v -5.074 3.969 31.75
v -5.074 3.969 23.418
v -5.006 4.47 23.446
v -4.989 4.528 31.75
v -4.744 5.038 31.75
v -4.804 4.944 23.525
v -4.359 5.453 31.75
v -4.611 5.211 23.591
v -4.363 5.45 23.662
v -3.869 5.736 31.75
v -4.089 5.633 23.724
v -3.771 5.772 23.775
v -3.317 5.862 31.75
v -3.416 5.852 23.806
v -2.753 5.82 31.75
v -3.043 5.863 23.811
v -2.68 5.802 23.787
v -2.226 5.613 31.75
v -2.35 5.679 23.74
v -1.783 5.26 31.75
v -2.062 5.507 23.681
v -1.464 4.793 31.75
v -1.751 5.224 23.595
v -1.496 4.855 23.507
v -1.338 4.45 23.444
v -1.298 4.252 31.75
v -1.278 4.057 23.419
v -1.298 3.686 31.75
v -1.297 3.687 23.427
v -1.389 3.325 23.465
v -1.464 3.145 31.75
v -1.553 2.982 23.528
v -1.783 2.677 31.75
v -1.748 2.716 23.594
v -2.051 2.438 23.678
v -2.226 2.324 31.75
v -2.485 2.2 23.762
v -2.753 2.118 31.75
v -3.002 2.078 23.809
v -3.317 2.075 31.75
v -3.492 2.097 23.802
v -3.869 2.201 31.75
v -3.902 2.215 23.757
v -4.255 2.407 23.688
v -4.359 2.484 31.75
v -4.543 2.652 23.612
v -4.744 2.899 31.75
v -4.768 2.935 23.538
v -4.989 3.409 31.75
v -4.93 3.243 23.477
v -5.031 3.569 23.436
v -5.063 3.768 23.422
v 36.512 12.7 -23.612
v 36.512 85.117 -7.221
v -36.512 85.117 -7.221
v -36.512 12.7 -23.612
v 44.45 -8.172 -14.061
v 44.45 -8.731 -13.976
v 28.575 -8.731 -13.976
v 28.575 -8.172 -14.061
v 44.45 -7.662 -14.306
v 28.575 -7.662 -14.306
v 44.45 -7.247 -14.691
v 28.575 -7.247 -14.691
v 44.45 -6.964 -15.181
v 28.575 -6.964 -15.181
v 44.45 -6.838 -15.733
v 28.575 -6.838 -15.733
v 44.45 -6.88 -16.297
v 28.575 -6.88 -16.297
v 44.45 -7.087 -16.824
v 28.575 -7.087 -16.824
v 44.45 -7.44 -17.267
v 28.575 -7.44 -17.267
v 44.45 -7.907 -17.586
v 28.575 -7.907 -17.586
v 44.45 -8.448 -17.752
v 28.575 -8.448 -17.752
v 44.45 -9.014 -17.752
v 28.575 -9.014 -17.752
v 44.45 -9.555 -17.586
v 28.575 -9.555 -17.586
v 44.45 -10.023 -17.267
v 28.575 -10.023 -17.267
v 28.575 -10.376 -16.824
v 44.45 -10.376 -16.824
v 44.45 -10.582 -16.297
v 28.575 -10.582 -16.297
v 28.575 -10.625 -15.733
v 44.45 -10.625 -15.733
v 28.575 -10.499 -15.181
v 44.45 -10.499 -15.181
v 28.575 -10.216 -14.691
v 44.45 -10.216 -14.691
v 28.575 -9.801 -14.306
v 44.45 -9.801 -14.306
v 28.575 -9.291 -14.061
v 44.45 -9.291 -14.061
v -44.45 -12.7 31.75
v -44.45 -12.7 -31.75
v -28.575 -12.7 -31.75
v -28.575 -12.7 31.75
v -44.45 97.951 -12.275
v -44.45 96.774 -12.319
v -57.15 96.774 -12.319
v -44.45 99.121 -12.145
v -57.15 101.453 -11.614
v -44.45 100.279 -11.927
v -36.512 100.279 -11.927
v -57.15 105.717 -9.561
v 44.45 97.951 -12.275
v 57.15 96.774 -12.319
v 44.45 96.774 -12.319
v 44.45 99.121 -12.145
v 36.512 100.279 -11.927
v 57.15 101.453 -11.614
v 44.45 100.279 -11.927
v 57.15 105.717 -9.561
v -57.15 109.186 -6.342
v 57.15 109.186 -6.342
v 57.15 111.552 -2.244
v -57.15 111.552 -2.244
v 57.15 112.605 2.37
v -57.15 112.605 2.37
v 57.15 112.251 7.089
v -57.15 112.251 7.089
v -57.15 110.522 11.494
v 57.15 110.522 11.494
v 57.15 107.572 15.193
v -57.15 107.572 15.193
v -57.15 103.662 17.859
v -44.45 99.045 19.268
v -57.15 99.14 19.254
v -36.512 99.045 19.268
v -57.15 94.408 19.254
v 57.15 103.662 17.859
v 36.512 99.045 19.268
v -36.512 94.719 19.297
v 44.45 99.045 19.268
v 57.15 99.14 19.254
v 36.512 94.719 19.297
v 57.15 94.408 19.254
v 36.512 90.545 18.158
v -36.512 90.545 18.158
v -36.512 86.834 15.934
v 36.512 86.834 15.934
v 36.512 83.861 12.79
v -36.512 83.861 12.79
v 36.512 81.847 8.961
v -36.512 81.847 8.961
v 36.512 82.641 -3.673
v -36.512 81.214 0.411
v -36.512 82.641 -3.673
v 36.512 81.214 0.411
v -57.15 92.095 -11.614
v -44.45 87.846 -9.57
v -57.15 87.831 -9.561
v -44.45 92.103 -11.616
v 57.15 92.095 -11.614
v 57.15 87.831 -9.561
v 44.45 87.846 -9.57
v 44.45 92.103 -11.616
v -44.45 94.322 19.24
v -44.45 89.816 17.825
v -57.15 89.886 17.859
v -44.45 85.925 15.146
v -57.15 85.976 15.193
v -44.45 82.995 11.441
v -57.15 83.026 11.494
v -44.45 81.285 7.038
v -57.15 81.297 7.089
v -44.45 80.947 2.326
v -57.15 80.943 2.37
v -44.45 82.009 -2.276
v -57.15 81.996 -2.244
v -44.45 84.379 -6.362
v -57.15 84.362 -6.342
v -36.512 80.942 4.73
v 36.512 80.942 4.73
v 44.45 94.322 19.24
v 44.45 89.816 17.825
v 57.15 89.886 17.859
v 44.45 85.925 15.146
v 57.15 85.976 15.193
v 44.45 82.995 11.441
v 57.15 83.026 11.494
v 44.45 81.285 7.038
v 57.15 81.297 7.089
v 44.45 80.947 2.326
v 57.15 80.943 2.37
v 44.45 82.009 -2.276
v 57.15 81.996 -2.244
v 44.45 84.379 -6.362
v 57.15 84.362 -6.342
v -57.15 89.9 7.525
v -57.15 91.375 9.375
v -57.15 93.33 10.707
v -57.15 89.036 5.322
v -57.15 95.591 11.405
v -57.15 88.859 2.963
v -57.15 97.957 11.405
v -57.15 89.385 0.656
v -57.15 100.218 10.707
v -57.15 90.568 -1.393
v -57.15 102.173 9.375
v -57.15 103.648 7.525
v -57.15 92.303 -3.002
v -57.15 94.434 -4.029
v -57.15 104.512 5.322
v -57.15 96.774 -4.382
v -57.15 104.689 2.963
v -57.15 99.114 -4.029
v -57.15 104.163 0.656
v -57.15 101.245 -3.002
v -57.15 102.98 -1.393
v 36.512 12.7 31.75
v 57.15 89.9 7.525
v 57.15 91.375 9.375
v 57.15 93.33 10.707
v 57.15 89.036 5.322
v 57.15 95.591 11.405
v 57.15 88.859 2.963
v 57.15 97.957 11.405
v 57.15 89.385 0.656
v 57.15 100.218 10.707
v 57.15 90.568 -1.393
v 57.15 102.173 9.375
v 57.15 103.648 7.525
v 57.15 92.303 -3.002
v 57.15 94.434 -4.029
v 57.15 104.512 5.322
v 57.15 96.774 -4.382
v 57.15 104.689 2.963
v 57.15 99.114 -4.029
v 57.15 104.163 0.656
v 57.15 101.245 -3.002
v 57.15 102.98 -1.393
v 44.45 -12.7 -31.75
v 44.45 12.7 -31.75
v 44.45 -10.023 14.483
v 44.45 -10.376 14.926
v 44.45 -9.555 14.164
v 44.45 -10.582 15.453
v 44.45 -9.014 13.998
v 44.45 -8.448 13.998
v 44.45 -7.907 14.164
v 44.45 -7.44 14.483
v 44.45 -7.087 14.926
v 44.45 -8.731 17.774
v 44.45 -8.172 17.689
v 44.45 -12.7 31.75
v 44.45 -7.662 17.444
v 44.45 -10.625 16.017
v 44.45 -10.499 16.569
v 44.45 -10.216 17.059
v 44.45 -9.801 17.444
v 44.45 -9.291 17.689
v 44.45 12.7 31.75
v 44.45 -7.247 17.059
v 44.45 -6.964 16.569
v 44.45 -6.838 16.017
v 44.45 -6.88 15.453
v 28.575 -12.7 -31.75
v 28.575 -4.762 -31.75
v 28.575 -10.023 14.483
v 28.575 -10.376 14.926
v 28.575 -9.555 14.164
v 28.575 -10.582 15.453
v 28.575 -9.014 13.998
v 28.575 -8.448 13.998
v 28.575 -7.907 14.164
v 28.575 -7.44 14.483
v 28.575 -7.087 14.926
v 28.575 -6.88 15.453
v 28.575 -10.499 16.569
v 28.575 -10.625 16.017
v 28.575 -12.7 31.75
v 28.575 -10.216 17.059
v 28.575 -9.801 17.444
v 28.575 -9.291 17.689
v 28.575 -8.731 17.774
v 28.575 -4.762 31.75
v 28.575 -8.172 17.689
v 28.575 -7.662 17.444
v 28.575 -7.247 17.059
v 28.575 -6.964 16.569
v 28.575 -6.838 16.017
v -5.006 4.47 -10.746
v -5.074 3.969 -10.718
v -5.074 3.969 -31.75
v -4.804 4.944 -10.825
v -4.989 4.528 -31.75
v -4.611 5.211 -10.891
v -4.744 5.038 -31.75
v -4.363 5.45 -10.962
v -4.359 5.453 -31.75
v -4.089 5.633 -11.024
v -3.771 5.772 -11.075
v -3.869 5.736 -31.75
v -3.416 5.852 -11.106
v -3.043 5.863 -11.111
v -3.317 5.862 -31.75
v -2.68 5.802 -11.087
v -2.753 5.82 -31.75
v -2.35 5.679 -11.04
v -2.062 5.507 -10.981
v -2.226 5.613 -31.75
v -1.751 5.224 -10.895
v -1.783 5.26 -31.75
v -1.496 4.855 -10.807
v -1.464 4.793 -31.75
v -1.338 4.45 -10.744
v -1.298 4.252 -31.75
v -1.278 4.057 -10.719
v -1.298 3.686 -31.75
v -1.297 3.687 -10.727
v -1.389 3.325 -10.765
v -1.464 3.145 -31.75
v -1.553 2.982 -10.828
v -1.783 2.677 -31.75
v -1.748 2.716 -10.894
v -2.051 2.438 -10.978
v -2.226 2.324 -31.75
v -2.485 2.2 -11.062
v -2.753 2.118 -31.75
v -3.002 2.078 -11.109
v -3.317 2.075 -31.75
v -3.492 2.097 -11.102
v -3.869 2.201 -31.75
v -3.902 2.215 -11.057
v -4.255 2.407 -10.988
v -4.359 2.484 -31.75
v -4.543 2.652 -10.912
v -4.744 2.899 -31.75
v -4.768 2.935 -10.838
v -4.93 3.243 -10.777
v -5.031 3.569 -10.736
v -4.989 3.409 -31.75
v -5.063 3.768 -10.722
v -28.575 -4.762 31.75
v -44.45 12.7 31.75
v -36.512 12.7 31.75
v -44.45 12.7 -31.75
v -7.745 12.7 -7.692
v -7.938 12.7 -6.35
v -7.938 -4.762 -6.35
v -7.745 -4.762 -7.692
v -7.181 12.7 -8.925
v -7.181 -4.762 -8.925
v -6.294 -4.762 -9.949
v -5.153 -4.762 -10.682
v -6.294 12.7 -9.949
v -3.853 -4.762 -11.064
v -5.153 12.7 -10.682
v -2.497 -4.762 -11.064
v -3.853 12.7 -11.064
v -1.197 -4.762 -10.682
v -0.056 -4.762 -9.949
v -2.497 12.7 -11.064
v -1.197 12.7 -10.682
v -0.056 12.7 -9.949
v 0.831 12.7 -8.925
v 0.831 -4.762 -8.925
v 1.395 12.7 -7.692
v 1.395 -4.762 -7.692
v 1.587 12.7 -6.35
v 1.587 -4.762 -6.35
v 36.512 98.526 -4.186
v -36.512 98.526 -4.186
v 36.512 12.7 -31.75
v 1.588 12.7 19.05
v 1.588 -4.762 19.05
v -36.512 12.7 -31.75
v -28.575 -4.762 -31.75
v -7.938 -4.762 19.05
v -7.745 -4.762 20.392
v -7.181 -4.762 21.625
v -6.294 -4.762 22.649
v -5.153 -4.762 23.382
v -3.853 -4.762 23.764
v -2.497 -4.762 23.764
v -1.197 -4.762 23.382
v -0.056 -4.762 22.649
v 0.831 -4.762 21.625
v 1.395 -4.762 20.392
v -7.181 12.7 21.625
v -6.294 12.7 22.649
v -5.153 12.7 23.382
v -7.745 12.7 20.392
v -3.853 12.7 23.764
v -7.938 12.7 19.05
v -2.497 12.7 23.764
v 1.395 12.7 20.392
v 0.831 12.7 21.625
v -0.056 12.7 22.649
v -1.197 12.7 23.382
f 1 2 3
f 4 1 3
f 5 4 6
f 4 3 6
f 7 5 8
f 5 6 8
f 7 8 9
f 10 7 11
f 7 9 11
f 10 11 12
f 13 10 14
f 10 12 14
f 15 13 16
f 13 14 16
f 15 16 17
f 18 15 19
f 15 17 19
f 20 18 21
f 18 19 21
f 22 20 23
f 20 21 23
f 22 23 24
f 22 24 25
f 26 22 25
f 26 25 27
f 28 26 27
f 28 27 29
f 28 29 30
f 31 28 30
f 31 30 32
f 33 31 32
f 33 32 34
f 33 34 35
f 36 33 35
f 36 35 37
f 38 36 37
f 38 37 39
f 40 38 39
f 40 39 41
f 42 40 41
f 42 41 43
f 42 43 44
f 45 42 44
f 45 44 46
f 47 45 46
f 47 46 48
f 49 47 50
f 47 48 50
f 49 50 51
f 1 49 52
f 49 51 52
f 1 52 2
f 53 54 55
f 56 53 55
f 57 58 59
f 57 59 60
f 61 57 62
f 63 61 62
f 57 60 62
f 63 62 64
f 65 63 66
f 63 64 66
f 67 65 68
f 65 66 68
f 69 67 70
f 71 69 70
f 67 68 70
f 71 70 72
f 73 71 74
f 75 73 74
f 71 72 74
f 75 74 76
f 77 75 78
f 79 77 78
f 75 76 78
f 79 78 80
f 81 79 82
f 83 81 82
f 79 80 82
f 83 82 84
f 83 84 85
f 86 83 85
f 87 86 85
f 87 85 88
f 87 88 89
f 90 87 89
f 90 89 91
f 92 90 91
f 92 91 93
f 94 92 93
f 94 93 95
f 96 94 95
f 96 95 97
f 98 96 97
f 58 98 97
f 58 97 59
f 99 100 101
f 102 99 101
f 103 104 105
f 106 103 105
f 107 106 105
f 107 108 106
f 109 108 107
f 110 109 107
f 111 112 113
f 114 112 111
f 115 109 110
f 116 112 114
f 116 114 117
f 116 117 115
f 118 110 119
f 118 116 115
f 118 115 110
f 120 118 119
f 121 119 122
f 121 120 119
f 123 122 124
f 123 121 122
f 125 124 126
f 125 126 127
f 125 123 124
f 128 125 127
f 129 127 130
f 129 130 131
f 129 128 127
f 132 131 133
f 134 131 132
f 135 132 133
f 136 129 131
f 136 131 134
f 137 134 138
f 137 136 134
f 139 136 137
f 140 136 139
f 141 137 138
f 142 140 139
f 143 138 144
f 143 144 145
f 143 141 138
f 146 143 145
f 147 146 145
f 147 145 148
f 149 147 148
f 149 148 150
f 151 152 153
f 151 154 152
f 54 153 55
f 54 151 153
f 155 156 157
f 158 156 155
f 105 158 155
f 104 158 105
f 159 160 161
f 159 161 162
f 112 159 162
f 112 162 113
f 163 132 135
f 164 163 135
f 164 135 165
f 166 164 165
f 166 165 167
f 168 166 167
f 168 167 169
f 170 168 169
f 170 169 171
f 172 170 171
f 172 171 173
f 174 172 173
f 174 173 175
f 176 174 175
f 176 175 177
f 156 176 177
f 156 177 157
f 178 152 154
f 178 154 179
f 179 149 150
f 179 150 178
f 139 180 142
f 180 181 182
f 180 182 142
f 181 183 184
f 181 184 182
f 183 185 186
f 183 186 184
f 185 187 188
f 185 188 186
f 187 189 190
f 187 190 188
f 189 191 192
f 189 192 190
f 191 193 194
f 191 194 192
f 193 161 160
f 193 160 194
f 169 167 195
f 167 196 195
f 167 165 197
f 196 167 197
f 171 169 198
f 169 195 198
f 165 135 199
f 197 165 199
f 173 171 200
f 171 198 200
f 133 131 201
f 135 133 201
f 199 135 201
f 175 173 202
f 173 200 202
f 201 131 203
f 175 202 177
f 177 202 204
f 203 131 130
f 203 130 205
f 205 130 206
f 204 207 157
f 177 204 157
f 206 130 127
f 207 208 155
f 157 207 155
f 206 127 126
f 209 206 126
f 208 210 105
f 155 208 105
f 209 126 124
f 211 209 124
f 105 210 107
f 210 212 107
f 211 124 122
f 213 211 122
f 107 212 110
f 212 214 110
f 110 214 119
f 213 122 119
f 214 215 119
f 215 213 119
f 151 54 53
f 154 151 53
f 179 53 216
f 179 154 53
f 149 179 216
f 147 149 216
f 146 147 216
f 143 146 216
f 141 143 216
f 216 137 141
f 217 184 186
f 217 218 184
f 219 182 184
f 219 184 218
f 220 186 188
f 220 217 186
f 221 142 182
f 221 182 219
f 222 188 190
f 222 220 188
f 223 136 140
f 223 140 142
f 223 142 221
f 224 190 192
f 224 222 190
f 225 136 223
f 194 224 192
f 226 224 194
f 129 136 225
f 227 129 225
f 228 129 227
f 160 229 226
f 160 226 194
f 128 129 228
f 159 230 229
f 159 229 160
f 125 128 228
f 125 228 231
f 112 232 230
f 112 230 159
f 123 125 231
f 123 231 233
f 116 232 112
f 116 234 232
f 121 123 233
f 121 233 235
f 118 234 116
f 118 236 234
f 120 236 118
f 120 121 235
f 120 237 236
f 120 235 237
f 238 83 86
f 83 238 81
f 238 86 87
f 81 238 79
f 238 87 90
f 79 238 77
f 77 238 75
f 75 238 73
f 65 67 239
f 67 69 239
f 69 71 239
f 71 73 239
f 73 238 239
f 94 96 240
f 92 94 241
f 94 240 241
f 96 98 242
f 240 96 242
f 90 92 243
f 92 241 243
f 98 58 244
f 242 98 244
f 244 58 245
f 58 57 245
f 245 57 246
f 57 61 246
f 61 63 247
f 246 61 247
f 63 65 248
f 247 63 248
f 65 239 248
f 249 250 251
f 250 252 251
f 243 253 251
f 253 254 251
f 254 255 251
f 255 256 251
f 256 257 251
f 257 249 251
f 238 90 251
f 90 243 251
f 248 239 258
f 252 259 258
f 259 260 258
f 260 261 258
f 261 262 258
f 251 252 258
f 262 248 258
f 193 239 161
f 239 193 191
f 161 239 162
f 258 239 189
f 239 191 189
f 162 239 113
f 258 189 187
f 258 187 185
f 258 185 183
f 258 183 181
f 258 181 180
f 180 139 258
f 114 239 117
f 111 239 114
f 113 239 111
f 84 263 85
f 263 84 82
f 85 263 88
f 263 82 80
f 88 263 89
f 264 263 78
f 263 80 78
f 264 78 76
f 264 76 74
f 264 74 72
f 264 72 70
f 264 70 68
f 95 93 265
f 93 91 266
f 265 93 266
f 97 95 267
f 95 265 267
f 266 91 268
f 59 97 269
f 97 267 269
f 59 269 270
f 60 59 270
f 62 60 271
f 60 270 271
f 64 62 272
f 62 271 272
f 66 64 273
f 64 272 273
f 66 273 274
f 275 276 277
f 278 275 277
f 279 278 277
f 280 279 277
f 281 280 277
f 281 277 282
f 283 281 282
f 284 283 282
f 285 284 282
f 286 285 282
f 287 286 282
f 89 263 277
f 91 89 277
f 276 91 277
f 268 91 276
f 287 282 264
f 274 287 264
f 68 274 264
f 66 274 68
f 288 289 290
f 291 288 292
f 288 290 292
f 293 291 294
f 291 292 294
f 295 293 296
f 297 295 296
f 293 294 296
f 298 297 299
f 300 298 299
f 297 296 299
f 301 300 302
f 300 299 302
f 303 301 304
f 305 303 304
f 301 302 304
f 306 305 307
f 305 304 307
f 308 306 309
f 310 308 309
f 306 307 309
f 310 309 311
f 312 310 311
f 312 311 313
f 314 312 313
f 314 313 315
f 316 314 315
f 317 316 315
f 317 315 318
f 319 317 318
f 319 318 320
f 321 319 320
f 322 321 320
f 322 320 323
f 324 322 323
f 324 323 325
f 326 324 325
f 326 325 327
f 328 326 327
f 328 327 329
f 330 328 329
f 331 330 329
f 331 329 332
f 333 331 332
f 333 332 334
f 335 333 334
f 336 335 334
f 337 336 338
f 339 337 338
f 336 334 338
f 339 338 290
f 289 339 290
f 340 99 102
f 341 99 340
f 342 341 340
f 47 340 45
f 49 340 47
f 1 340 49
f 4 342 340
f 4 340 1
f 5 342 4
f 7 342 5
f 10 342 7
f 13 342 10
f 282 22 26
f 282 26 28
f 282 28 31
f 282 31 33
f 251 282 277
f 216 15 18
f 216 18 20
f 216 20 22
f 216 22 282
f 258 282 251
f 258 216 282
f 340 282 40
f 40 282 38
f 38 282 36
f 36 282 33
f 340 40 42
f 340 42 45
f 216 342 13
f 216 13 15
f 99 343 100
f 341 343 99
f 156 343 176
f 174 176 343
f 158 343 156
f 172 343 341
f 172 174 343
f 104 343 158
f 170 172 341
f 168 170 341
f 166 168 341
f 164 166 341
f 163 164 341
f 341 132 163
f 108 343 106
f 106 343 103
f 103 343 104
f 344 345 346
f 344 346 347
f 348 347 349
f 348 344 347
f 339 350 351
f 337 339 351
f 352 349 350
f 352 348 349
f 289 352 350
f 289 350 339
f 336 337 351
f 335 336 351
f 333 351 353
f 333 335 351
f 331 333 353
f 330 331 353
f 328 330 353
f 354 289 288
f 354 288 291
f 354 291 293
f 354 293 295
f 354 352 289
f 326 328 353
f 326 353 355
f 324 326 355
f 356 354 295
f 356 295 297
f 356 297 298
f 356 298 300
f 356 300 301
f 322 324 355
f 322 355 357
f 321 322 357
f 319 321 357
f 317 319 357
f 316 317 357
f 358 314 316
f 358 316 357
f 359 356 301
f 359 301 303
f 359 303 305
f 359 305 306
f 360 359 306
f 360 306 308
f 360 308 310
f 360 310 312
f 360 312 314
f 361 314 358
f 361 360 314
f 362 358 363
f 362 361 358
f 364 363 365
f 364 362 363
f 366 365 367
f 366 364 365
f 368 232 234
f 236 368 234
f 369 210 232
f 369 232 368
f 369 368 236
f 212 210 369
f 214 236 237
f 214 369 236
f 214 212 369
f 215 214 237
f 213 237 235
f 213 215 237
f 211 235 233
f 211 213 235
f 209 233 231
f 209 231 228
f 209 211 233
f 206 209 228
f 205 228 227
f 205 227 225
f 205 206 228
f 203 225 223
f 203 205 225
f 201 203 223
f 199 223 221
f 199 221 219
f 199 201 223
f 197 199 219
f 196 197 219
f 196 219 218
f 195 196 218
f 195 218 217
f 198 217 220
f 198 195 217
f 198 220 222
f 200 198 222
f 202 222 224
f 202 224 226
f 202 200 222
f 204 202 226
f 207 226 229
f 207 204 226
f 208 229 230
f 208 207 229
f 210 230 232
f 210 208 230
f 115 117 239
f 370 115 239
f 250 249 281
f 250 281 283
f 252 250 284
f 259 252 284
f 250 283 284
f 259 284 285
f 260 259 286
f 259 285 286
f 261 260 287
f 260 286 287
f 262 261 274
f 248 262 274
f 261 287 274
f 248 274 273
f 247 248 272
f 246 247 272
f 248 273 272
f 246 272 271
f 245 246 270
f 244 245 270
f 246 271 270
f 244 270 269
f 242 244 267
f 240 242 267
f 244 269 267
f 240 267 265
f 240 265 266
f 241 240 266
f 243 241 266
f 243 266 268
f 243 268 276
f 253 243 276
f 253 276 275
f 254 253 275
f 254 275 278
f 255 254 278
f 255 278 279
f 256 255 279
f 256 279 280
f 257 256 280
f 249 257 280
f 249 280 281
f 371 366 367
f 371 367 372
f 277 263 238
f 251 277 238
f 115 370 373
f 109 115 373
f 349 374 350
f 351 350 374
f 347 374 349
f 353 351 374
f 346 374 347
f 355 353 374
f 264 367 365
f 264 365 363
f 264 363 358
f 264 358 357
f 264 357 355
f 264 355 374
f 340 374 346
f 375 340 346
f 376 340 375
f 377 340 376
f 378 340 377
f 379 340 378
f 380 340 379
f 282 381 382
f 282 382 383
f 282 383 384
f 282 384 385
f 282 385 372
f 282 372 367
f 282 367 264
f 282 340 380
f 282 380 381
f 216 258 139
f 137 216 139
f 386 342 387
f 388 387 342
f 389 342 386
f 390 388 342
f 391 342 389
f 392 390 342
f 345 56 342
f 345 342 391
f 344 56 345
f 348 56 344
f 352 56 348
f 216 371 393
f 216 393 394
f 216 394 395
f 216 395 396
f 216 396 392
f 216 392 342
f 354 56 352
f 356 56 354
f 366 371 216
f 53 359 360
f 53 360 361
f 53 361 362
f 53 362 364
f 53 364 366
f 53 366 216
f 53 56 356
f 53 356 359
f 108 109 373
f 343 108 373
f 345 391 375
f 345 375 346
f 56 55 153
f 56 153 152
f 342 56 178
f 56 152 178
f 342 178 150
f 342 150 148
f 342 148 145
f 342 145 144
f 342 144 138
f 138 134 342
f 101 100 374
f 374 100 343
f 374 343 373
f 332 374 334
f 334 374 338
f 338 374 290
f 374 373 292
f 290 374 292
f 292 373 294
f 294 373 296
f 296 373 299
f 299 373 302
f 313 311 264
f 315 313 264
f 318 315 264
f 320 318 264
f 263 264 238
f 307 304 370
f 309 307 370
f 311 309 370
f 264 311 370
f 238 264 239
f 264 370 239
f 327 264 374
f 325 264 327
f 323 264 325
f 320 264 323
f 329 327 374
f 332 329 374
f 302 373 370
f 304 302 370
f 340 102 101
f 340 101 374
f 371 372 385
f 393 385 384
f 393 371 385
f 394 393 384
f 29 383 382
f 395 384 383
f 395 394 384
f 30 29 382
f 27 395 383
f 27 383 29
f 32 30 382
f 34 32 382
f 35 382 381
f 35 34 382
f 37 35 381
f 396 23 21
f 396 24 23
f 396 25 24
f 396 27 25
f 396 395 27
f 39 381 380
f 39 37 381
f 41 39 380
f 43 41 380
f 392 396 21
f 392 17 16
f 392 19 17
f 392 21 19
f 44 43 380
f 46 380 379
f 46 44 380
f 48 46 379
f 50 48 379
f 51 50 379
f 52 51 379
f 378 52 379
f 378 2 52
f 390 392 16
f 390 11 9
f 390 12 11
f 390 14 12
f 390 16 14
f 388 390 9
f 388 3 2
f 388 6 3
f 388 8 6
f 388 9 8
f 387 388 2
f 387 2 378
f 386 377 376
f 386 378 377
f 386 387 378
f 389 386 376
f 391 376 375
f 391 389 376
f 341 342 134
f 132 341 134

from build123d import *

# Parameters (mm, degrees)
SKETCH1_W                  = 88.9
SKETCH1_H                  = 63.5
BOSS_EXTRUDE1_DEPTH        = 12.7
SKETCH2_W                  = 57.15
SKETCH2_H                  = 7.9375
CUT_EXTRUDE1_DEPTH         = 79.545162168
F_10_24_TAPPED_HOLE1_D     = 3.7973
CUT_EXTRUDE2_DEPTH         = 25.4
BOSS_EXTRUDE2_START        = 44.45
BOSS_EXTRUDE2_DEPTH        = 7.9375
BOSS_EXTRUDE3_START        = -36.5125
BOSS_EXTRUDE3_DEPTH        = 7.9375
SKETCH7_W                  = 73.025
SKETCH7_H                  = 89.79384994
BOSS_EXTRUDE4_DEPTH        = 7.9375
SKETCH8_R                  = 15.875
SKETCH8_R_2                = 7.9375
BOSS_EXTRUDE5_DEPTH        = 57.15
F_10_24_TAPPED_HOLE2_D     = 3.7973
F_10_24_TAPPED_HOLE2_DEPTH = 15.875


with BuildPart() as part:
    # Sketch1 → Boss-Extrude1 (new, symmetric)
    with BuildSketch(Plane(origin=(0, 0, 0), x_dir=(1, 0, 0), z_dir=(0, 1, 0))):
        Rectangle(SKETCH1_W, SKETCH1_H)
    extrude(amount=BOSS_EXTRUDE1_DEPTH, both=True)

    # Sketch2 → Cut-Extrude1 (cut, through all)
    with BuildSketch(Plane.XY.offset(31.75)):
        with Locations((0, -8.73125)):
            Rectangle(SKETCH2_W, SKETCH2_H)
    extrude(amount=-CUT_EXTRUDE1_DEPTH, mode=Mode.SUBTRACT)

    # #10-24 Tapped Hole1 (through all)
    with Locations(Plane.XY.offset(31.75)):
        with Locations((-3.175, 3.96875)):
            Hole(F_10_24_TAPPED_HOLE1_D / 2)

    # Sketch5 → Cut-Extrude2 (cut)
    with BuildSketch(Plane(origin=(0, 12.7, 0), x_dir=(1, 0, 0), z_dir=(0, 1, 0))):
        with BuildLine():
            Line((-7.9375, -19.05), (-7.9375, 6.35))
            ThreePointArc((-7.9375, 6.35), (-3.175, 11.1125), (1.5875, 6.35))
            Line((1.5875, 6.35), (1.5875, -19.05))
            ThreePointArc((1.5875, -19.05), (-3.175, -23.8125), (-7.9375, -19.05))
        make_face()
    extrude(amount=-CUT_EXTRUDE2_DEPTH, mode=Mode.SUBTRACT)

    # Sketch6 → Boss-Extrude2 (add)
    with BuildSketch(Plane(origin=(0, 0, 0), x_dir=(0, 0, -1), z_dir=(1, 0, 0)).offset(BOSS_EXTRUDE2_START)):
        with BuildLine():
            Line((-31.75, 12.7), (-19.267674347, 99.045324328))
            ThreePointArc((-19.267674347, 99.045324328), (-2.928920422, 80.911389994), (11.927343936, 100.278523586))
            Line((11.927343936, 100.278523586), (31.75, 12.7))
            Line((31.75, 12.7), (-31.75, 12.7))
        make_face()
    extrude(amount=-BOSS_EXTRUDE2_DEPTH)

    # Sketch6<2> → Boss-Extrude3 (add)
    with BuildSketch(Plane(origin=(0, 0, 0), x_dir=(0, 0, -1), z_dir=(1, 0, 0)).offset(BOSS_EXTRUDE3_START)):
        with BuildLine():
            Line((-31.75, 12.7), (-19.267674347, 99.045324328))
            ThreePointArc((-19.267674347, 99.045324328), (-2.928920422, 80.911389994), (11.927343936, 100.278523586))
            Line((11.927343936, 100.278523586), (31.75, 12.7))
            Line((31.75, 12.7), (-31.75, 12.7))
        make_face()
    extrude(amount=-BOSS_EXTRUDE3_DEPTH)

    # Sketch7 → Boss-Extrude4 (add)
    with BuildSketch(Plane(origin=(0, 7.455044818, -32.937151123), x_dir=(-1, 0, 0), z_dir=(0, 0.22075739126394447, -0.9753287518587453))):
        with Locations((0, 50.274552946)):
            Rectangle(SKETCH7_W, SKETCH7_H)
    extrude(amount=-BOSS_EXTRUDE4_DEPTH)

    # Sketch8 → Boss-Extrude5 (add, symmetric)
    with BuildSketch(Plane(origin=(0, 0, 0), x_dir=(0, 0, -1), z_dir=(1, 0, 0))):
        with Locations((-3.556, 96.774)):
            Circle(SKETCH8_R)
        with Locations((-3.556, 96.774)):
            Circle(SKETCH8_R_2, mode=Mode.SUBTRACT)
    extrude(amount=BOSS_EXTRUDE5_DEPTH, both=True)

    # #10-24 Tapped Hole2
    with Locations(Plane(origin=(44.45, 0, 0), x_dir=(0, 0, -1), z_dir=(1, 0, 0))):
        with Locations((-15.875, -8.73125), (15.875, -8.73125)):
            Hole(F_10_24_TAPPED_HOLE2_D / 2, depth=F_10_24_TAPPED_HOLE2_DEPTH)


solid = part.part
